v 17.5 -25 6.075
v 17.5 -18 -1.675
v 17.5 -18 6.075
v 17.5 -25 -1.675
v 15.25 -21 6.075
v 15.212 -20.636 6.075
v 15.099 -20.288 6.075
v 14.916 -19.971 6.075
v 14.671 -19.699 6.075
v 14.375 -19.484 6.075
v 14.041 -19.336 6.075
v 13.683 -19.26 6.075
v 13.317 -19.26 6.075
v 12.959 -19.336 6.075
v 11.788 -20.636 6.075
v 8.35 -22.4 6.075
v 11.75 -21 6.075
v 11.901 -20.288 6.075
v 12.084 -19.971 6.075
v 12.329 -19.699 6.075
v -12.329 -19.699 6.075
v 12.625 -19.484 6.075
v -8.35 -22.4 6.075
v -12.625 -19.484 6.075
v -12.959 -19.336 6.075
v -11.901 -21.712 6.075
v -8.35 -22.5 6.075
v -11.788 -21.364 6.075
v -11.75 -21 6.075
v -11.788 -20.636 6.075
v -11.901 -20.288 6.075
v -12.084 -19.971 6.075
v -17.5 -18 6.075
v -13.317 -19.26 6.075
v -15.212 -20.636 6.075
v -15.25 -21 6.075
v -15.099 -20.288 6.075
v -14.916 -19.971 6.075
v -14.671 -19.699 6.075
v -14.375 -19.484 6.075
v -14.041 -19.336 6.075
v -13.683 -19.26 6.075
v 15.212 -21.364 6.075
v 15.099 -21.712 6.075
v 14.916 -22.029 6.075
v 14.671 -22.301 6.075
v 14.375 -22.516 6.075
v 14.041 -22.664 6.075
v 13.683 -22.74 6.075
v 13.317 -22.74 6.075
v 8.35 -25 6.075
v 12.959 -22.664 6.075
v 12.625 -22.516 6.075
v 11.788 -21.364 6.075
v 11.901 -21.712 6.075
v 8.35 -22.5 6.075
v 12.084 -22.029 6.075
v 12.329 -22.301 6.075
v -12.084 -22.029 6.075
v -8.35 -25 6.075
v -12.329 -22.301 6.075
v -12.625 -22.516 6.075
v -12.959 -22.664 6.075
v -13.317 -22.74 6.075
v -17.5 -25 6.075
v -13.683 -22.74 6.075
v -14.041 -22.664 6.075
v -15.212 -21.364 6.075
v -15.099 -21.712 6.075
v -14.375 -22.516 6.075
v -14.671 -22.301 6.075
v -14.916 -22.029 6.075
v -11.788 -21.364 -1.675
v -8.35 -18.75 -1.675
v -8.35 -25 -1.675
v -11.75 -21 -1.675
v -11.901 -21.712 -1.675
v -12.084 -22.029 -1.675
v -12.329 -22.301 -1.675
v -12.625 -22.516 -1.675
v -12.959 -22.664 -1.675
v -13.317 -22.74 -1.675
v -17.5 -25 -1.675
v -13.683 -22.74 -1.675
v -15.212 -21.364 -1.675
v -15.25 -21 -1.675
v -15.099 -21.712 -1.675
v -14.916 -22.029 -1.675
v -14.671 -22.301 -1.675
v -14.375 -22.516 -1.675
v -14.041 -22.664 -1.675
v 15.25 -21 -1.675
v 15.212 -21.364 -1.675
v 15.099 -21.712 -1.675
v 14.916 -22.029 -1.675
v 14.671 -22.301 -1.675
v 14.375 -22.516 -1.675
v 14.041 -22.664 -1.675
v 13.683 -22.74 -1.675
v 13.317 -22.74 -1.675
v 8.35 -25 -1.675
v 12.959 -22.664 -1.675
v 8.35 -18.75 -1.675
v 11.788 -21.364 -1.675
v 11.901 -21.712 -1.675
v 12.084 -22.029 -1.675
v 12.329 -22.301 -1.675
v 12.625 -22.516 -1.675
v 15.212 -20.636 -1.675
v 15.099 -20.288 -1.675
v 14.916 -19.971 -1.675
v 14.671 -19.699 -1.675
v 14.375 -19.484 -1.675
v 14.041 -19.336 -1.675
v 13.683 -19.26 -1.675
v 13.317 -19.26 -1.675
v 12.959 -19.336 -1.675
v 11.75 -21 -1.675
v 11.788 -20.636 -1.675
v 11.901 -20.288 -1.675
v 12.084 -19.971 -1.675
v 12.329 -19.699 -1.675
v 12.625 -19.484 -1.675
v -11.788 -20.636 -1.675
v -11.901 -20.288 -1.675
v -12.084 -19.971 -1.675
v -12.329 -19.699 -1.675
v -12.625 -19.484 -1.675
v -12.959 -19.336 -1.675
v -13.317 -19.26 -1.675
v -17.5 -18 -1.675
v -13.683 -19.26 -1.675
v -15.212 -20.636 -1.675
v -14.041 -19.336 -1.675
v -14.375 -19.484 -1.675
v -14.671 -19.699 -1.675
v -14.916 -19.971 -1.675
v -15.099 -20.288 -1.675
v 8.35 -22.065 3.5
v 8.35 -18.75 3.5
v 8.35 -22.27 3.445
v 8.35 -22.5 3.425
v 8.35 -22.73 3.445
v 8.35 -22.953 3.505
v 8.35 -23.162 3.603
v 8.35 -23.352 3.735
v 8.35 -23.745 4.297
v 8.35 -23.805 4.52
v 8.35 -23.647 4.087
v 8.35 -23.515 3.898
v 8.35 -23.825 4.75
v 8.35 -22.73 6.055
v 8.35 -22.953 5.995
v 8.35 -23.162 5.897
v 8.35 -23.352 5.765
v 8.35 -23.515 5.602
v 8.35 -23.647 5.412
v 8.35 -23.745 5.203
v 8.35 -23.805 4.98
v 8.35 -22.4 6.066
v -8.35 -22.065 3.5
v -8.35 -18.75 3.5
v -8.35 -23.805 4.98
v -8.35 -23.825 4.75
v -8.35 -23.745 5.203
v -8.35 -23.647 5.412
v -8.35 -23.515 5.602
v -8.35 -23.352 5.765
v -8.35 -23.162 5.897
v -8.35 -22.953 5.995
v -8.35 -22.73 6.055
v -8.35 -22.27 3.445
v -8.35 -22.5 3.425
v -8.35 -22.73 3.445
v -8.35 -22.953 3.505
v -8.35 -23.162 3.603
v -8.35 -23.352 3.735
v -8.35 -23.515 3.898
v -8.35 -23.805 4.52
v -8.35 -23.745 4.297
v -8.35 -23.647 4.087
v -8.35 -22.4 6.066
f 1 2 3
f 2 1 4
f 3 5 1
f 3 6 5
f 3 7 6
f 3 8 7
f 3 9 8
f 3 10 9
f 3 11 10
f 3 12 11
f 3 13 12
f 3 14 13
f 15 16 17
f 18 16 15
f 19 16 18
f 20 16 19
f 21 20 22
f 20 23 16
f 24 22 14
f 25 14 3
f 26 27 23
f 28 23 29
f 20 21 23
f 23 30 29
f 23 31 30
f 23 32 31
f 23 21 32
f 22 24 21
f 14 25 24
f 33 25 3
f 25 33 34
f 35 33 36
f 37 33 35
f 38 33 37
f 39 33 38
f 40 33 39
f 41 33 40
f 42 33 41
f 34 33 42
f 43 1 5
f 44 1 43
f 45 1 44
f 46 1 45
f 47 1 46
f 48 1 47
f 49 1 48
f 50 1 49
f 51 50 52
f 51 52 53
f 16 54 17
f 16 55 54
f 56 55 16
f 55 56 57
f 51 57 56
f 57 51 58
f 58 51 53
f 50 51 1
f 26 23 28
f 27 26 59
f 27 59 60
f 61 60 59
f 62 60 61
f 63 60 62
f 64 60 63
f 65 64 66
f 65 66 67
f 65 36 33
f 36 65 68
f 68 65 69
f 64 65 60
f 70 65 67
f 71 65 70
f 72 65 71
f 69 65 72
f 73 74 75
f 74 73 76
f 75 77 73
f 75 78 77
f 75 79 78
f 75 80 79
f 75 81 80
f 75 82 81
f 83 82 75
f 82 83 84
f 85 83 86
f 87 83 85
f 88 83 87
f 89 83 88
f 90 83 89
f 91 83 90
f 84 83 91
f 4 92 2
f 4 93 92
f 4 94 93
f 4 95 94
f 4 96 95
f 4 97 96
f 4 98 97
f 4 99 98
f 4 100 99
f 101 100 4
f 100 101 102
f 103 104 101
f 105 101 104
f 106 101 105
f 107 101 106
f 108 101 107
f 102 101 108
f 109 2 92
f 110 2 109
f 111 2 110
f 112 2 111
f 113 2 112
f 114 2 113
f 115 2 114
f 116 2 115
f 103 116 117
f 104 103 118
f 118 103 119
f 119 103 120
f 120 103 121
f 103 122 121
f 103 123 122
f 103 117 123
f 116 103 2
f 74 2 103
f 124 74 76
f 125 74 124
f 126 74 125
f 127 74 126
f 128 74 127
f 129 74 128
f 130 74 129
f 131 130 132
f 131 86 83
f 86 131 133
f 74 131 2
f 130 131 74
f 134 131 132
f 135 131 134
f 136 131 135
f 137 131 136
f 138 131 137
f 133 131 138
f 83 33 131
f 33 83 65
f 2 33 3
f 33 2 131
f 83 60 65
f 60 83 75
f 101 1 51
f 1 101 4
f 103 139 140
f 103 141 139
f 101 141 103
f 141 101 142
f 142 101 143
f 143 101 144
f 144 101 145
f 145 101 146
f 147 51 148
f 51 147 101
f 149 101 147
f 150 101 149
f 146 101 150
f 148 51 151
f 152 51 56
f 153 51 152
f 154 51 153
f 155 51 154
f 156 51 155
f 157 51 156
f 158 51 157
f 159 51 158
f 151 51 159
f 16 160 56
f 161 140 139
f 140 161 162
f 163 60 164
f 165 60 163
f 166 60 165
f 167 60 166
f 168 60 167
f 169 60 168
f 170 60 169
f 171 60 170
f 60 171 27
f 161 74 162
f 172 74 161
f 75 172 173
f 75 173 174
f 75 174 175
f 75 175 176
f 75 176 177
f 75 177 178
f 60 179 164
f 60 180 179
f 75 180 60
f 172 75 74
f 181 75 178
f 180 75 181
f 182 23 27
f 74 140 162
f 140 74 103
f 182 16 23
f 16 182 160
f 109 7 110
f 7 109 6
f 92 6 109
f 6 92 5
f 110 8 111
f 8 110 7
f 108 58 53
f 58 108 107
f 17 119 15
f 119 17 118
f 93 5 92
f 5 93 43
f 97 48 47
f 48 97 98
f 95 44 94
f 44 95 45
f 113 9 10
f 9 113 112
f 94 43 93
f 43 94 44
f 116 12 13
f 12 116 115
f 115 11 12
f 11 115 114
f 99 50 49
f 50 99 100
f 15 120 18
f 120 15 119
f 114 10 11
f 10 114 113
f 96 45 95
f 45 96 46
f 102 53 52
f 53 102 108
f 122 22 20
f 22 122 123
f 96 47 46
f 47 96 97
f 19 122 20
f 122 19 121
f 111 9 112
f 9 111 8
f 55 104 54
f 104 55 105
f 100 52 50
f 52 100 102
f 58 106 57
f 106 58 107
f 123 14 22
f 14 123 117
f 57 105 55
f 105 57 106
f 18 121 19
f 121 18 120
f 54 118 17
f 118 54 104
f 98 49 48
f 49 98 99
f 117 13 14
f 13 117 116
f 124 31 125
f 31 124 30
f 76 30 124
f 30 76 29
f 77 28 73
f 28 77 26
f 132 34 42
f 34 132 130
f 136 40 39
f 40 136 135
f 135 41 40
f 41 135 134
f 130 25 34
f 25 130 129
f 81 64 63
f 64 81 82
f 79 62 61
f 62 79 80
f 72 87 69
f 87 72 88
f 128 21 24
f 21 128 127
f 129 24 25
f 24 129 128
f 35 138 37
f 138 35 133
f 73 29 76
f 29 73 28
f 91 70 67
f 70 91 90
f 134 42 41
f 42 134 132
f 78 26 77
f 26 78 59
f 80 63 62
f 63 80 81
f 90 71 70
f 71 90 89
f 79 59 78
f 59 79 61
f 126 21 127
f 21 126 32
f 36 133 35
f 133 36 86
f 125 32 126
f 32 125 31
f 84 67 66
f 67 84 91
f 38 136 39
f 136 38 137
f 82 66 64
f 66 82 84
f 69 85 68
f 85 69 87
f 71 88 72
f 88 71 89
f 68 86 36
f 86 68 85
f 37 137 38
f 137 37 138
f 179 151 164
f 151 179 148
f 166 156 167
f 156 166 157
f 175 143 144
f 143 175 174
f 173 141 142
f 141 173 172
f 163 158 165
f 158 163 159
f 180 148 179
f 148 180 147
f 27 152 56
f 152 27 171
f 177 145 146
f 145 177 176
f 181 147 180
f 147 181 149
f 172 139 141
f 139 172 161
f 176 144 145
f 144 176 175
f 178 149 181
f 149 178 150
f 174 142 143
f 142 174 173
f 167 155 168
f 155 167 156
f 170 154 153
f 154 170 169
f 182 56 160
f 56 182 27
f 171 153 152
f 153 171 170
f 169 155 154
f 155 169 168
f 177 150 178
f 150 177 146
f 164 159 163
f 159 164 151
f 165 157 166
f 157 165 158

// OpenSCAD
/*
 * Wolfshöhle Case
 * Copyright (c) 2024 Lone Dynamics Corporation. All rights reserved.
 *
 * required hardware:
 *  - 2 x M3 x 12mm bolt
 *  - 2 x M3 nuts
 *
 */
  
$fn = 30;

box_width = 35;
box_length = 25;
box_height = 12;
box_thickness = 2.0;

lid_thickness = 2.5;

cutout_width = 16.50;
cutout_length = 24.50;
cutout_height = 9.5;

cutout_usb_width = 12;

board_height = 1.4;

roundness = 1;

translate([0,0,0]) color([0.8,0.8,0.8]) msb_case();
//translate([0,0,-2.5]) msb_board();

//translate([0,-27,3.5]) zwolf();

module msb_board()
{
	
	difference() {
		union() {
			color([0.0,0.8,0.0]) cube([35, 50, 1.6], center=true);
			
			translate([0,-21.5,2.5]) color([1,1,1]) cube([12, 2, 6.5], center=true);
			translate([0,-22.5,1.5]) color([0,0,0]) cube([12, 5, 4.6], center=true);
			
		}
		translate([35/2-4,-50/2+4,-10]) cylinder(d=3, h=100);
		translate([-35/2+4,-50/2+4,-10]) cylinder(d=3, h=100);
	}
	
}


module msb_case()
{	

    translate([0,-50/2+2.5,4.75]) rotate([0,90,0]) cylinder(d=2.65, h=18, center=true, $fn=36);
    
	difference() {
		
		union() {
            translate([0,-50/2+3.5,2.2]) {
                cube([35,7,7.75], center=true);
            }
            

        }

        translate([0,-50/2+5-3,0]) {
            cube([16.5+0.2,8.5,7], center=true);
        }

        translate([0,-50/2+5-5.4,5]) {
            cube([16.5+0.2,6,5], center=true);
        }

		// bolt holes
		translate([35/2-4,-50/2+4,-10]) cylinder(d=3.5, h=100);
		translate([-35/2+4,-50/2+4,-10]) cylinder(d=3.5, h=100);
		

		
	}
	
}

 
module zwolf(height = 1.6)
{
	 
	translate([0,-2.25,0])
		linear_extrude(1)
			text("zwölf", size=2, halign="center", font="Lato:style=Black");

	 difference() {
		 
		union () {
			color([0,1,0]) cube([16,13.5,height], center=true);
			translate([-6.35,4,0]) color([1,1,0]) cube([1.7,5,height+0.01], center=true);
			translate([-6.35,-4,-0.01]) color([1,1,0]) cube([1.7,5,height+0.01], center=true);
			translate([-3.81,4,0]) color([1,1,0]) cube([1.7,5,height+0.01], center=true);
			translate([-3.81,-4,-0.01]) color([1,1,0]) cube([1.7,5,height+0.01], center=true);
			translate([-1.27,4,0]) color([1,1,0]) cube([1.7,5,height+0.01], center=true);
			translate([-1.27,-4,-0.01]) color([1,1,0]) cube([1.7,5,height+0.01], center=true);
			translate([1.27,4,0]) color([1,1,0]) cube([1.7,5,height+0.01], center=true);
			translate([1.27,-4,-0.01]) color([1,1,0]) cube([1.7,5,height+0.01], center=true);
			translate([3.81,4,0]) color([1,1,0]) cube([1.7,5,height+0.01], center=true);
			translate([3.81,-4,-0.01]) color([1,1,0]) cube([1.7,5,height+0.01], center=true);
			translate([6.35,4,0]) color([1,1,0]) cube([1.7,5,height+0.01], center=true);
			translate([6.35,-4,-0.01]) color([1,1,0]) cube([1.7,5,height+0.01], center=true);
	   }
	 
		translate([-6.35,2.75,-1]) cylinder(d=1, h=10);		 
		translate([-6.35,2.75-7.62,-1]) cylinder(d=1, h=10);
		translate([-3.81,2.75,-1]) cylinder(d=1, h=10);
		translate([-3.81,2.75-7.62,-1]) cylinder(d=1, h=10);
		translate([-1.27,2.75,-1]) cylinder(d=1, h=10);
		translate([-1.27,2.75-7.62,-1]) cylinder(d=1, h=10);
		translate([1.27,2.75,-1]) cylinder(d=1, h=10);
		translate([1.27,2.75-7.62,-1]) cylinder(d=1, h=10);
		translate([3.81,2.75,-1]) cylinder(d=1, h=10);
		translate([3.81,2.75-7.62,-1]) cylinder(d=1, h=10);
		translate([6.35,2.75,-1]) cylinder(d=1, h=10);
		translate([6.35,2.75-7.62,-1]) cylinder(d=1, h=10);
		
	 }
 }
